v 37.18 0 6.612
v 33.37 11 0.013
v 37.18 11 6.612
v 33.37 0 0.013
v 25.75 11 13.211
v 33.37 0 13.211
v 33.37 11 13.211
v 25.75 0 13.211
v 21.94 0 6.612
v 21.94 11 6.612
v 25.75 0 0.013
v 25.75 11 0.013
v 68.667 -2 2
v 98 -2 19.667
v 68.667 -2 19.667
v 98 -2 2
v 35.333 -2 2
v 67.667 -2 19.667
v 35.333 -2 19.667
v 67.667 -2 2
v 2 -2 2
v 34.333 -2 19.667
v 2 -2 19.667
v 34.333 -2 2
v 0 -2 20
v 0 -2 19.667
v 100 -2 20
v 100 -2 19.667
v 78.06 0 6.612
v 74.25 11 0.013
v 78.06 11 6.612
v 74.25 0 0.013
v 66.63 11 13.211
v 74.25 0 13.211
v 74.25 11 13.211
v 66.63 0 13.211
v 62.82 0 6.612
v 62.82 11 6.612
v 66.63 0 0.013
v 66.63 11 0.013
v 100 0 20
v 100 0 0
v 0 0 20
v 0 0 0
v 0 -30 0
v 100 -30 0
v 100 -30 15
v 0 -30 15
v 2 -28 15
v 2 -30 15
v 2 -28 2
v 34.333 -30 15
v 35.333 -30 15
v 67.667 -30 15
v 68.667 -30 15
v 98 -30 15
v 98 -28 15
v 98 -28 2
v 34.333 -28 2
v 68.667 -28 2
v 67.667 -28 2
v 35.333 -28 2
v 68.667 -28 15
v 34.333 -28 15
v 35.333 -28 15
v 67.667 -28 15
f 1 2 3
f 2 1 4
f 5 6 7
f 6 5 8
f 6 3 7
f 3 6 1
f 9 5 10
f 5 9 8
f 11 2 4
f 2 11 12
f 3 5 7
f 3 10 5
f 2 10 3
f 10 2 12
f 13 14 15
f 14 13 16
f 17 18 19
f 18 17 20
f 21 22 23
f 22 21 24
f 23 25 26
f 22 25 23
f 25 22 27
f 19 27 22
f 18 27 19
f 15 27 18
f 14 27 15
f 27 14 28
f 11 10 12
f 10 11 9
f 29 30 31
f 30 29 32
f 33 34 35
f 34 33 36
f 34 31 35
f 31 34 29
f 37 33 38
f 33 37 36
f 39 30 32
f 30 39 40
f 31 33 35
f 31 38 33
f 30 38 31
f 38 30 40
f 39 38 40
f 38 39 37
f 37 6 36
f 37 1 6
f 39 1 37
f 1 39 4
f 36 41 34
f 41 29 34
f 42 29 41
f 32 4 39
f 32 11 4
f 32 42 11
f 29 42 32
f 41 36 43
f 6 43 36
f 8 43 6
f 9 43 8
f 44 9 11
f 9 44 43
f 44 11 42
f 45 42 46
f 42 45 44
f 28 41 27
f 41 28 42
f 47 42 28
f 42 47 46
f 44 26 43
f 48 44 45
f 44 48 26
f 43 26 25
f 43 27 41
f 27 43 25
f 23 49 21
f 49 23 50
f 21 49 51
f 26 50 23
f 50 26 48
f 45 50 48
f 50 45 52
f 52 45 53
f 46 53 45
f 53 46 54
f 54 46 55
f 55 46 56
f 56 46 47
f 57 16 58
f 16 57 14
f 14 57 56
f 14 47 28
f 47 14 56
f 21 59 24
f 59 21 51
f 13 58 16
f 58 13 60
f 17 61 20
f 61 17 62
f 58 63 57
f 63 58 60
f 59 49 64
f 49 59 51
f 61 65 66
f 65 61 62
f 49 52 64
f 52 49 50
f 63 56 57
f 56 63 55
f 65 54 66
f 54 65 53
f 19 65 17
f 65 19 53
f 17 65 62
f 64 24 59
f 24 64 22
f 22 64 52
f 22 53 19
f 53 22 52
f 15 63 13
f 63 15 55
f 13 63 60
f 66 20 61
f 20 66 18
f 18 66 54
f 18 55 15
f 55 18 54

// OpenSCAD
width = 100;
back_height = 20;
front_height = 15;
depth = 30;

sections = 3;
wall_thickness = 2;
separator_thickness = 1;

front_wall_honeycomb = false;
back_wall_honeycomb = false;
sides_honeycomb = false;
separators_honeycomb = false;
bottom_honeycomb = false;

//-----------------
/* [Honeycomb pattern] */ 

// diameter in mm
hexagon_size = 10;
// mm
hexagon_spacing = 1;

hex_radius = hexagon_size / 2;
hex_width = sqrt(3) * hex_radius;
raster_spacing = hex_width + hexagon_spacing;


//-----------------
/* [HSW connector] */ 

// inner distance between corners
connector_size = 15.47;
connector_depth = 13;
tolerance = 0.1;
hexagon_distance = 40.88;

/* functions*/
function hexagon(radius) = [
    for (i = [0:5])
        [radius * cos(i * 60), radius * sin(i * 60)]
];

module hsw_connector() {
    rotate([90, 0, 0])
    linear_extrude(height = connector_depth)
    offset(r = -tolerance)
    polygon(points = hexagon(connector_size / 2));
}

module connectors() {
    count = max(1, round(width / (hexagon_distance + connector_size / 2)));
    dist = (width - (count-1) * hexagon_distance) / 2;
    h = (connector_size/2 - tolerance)*sqrt(3)/2;
    
    translate([dist, connector_depth - wall_thickness, h])
    for (i = [1 : count]) {
        translate([(i-1) * hexagon_distance, 0, 0])
        hsw_connector();    
    }
    
    rotate([90, 0, 0])
    hex_panel(width, back_height, wall_thickness, !back_wall_honeycomb, true);
}

module hexagon_cutout() {
    circle(hex_radius, $fn=6);
}
 
module hex_grid(size_x, size_y, solid = false, frame = false) {
    difference(){
        square([size_x, size_y]);
        
        if (!solid) {
            for (x = [-hex_radius : raster_spacing - 1 : size_x + hex_radius]) {
                for (y = [-hex_radius : raster_spacing : size_y + hex_radius]) {
                    translate(
                        [x,
                        y + (((x / raster_spacing) % 2) * raster_spacing / 2)])
                        hexagon_cutout();
                }
            }
        }
    }
    
    if (frame) {
        difference() {
            square([size_x, size_y]);
            
            translate([wall_thickness, wall_thickness])
            square([size_x - wall_thickness * 2, size_y - wall_thickness * 2]);
        }
    }
}

module hex_panel(size_x, size_y, thickness, solid = false, frame = false) {
    linear_extrude(thickness)
    hex_grid(size_x, size_y, solid, frame);
}

module hex_side(thickness = wall_thickness, solid = false) {
    linear_extrude(thickness)
    hex_grid(depth, back_height, solid);
}

module side(thickness = wall_thickness, solid = false) {
    intersection() {
        translate([wall_thickness, wall_thickness, 0])
        rotate([90, 0, -90])
        hex_side(thickness, solid);
        
        rotate([0, 90, 0])
        linear_extrude(wall_thickness)
        polygon([[0, 0], [0, -depth], [-front_height, -depth], [-back_height, 0]]);
    }

    translate([wall_thickness-thickness, 0, 0])
    rotate([0,90,0])
    linear_extrude(thickness)
    difference() {
        polygon([[0, 0], [0, -depth], [-front_height, -depth], [-back_height, 0]]);

        offset(-wall_thickness)
        polygon([[0, 0], [0, -depth], [-front_height, -depth], [-back_height, 0]]);
    }
}


module tray() {
    // bottom
    translate([0, -depth, 0])
    hex_panel(width, depth, wall_thickness, !bottom_honeycomb, true);

    // front
    translate([0, wall_thickness - depth, 0])
    rotate([90, 0, 0])
    hex_panel(width, front_height, wall_thickness, !front_wall_honeycomb, true);
    
    // sides
    side(wall_thickness, !sides_honeycomb);
    
    translate([width - wall_thickness, 0, 0])
    side(wall_thickness, !sides_honeycomb);
}

module separators() {
    section_count = max(1, sections);
    count = max(section_count - 1, 1);
    for (i = [1 : count]) {
        translate([i * width / (count + 1), 0, 0])
        side(separator_thickness, !separators_honeycomb);
    }
}

/* MAIN */
connectors();
tray();
if (sections > 1) {
    separators();
}
